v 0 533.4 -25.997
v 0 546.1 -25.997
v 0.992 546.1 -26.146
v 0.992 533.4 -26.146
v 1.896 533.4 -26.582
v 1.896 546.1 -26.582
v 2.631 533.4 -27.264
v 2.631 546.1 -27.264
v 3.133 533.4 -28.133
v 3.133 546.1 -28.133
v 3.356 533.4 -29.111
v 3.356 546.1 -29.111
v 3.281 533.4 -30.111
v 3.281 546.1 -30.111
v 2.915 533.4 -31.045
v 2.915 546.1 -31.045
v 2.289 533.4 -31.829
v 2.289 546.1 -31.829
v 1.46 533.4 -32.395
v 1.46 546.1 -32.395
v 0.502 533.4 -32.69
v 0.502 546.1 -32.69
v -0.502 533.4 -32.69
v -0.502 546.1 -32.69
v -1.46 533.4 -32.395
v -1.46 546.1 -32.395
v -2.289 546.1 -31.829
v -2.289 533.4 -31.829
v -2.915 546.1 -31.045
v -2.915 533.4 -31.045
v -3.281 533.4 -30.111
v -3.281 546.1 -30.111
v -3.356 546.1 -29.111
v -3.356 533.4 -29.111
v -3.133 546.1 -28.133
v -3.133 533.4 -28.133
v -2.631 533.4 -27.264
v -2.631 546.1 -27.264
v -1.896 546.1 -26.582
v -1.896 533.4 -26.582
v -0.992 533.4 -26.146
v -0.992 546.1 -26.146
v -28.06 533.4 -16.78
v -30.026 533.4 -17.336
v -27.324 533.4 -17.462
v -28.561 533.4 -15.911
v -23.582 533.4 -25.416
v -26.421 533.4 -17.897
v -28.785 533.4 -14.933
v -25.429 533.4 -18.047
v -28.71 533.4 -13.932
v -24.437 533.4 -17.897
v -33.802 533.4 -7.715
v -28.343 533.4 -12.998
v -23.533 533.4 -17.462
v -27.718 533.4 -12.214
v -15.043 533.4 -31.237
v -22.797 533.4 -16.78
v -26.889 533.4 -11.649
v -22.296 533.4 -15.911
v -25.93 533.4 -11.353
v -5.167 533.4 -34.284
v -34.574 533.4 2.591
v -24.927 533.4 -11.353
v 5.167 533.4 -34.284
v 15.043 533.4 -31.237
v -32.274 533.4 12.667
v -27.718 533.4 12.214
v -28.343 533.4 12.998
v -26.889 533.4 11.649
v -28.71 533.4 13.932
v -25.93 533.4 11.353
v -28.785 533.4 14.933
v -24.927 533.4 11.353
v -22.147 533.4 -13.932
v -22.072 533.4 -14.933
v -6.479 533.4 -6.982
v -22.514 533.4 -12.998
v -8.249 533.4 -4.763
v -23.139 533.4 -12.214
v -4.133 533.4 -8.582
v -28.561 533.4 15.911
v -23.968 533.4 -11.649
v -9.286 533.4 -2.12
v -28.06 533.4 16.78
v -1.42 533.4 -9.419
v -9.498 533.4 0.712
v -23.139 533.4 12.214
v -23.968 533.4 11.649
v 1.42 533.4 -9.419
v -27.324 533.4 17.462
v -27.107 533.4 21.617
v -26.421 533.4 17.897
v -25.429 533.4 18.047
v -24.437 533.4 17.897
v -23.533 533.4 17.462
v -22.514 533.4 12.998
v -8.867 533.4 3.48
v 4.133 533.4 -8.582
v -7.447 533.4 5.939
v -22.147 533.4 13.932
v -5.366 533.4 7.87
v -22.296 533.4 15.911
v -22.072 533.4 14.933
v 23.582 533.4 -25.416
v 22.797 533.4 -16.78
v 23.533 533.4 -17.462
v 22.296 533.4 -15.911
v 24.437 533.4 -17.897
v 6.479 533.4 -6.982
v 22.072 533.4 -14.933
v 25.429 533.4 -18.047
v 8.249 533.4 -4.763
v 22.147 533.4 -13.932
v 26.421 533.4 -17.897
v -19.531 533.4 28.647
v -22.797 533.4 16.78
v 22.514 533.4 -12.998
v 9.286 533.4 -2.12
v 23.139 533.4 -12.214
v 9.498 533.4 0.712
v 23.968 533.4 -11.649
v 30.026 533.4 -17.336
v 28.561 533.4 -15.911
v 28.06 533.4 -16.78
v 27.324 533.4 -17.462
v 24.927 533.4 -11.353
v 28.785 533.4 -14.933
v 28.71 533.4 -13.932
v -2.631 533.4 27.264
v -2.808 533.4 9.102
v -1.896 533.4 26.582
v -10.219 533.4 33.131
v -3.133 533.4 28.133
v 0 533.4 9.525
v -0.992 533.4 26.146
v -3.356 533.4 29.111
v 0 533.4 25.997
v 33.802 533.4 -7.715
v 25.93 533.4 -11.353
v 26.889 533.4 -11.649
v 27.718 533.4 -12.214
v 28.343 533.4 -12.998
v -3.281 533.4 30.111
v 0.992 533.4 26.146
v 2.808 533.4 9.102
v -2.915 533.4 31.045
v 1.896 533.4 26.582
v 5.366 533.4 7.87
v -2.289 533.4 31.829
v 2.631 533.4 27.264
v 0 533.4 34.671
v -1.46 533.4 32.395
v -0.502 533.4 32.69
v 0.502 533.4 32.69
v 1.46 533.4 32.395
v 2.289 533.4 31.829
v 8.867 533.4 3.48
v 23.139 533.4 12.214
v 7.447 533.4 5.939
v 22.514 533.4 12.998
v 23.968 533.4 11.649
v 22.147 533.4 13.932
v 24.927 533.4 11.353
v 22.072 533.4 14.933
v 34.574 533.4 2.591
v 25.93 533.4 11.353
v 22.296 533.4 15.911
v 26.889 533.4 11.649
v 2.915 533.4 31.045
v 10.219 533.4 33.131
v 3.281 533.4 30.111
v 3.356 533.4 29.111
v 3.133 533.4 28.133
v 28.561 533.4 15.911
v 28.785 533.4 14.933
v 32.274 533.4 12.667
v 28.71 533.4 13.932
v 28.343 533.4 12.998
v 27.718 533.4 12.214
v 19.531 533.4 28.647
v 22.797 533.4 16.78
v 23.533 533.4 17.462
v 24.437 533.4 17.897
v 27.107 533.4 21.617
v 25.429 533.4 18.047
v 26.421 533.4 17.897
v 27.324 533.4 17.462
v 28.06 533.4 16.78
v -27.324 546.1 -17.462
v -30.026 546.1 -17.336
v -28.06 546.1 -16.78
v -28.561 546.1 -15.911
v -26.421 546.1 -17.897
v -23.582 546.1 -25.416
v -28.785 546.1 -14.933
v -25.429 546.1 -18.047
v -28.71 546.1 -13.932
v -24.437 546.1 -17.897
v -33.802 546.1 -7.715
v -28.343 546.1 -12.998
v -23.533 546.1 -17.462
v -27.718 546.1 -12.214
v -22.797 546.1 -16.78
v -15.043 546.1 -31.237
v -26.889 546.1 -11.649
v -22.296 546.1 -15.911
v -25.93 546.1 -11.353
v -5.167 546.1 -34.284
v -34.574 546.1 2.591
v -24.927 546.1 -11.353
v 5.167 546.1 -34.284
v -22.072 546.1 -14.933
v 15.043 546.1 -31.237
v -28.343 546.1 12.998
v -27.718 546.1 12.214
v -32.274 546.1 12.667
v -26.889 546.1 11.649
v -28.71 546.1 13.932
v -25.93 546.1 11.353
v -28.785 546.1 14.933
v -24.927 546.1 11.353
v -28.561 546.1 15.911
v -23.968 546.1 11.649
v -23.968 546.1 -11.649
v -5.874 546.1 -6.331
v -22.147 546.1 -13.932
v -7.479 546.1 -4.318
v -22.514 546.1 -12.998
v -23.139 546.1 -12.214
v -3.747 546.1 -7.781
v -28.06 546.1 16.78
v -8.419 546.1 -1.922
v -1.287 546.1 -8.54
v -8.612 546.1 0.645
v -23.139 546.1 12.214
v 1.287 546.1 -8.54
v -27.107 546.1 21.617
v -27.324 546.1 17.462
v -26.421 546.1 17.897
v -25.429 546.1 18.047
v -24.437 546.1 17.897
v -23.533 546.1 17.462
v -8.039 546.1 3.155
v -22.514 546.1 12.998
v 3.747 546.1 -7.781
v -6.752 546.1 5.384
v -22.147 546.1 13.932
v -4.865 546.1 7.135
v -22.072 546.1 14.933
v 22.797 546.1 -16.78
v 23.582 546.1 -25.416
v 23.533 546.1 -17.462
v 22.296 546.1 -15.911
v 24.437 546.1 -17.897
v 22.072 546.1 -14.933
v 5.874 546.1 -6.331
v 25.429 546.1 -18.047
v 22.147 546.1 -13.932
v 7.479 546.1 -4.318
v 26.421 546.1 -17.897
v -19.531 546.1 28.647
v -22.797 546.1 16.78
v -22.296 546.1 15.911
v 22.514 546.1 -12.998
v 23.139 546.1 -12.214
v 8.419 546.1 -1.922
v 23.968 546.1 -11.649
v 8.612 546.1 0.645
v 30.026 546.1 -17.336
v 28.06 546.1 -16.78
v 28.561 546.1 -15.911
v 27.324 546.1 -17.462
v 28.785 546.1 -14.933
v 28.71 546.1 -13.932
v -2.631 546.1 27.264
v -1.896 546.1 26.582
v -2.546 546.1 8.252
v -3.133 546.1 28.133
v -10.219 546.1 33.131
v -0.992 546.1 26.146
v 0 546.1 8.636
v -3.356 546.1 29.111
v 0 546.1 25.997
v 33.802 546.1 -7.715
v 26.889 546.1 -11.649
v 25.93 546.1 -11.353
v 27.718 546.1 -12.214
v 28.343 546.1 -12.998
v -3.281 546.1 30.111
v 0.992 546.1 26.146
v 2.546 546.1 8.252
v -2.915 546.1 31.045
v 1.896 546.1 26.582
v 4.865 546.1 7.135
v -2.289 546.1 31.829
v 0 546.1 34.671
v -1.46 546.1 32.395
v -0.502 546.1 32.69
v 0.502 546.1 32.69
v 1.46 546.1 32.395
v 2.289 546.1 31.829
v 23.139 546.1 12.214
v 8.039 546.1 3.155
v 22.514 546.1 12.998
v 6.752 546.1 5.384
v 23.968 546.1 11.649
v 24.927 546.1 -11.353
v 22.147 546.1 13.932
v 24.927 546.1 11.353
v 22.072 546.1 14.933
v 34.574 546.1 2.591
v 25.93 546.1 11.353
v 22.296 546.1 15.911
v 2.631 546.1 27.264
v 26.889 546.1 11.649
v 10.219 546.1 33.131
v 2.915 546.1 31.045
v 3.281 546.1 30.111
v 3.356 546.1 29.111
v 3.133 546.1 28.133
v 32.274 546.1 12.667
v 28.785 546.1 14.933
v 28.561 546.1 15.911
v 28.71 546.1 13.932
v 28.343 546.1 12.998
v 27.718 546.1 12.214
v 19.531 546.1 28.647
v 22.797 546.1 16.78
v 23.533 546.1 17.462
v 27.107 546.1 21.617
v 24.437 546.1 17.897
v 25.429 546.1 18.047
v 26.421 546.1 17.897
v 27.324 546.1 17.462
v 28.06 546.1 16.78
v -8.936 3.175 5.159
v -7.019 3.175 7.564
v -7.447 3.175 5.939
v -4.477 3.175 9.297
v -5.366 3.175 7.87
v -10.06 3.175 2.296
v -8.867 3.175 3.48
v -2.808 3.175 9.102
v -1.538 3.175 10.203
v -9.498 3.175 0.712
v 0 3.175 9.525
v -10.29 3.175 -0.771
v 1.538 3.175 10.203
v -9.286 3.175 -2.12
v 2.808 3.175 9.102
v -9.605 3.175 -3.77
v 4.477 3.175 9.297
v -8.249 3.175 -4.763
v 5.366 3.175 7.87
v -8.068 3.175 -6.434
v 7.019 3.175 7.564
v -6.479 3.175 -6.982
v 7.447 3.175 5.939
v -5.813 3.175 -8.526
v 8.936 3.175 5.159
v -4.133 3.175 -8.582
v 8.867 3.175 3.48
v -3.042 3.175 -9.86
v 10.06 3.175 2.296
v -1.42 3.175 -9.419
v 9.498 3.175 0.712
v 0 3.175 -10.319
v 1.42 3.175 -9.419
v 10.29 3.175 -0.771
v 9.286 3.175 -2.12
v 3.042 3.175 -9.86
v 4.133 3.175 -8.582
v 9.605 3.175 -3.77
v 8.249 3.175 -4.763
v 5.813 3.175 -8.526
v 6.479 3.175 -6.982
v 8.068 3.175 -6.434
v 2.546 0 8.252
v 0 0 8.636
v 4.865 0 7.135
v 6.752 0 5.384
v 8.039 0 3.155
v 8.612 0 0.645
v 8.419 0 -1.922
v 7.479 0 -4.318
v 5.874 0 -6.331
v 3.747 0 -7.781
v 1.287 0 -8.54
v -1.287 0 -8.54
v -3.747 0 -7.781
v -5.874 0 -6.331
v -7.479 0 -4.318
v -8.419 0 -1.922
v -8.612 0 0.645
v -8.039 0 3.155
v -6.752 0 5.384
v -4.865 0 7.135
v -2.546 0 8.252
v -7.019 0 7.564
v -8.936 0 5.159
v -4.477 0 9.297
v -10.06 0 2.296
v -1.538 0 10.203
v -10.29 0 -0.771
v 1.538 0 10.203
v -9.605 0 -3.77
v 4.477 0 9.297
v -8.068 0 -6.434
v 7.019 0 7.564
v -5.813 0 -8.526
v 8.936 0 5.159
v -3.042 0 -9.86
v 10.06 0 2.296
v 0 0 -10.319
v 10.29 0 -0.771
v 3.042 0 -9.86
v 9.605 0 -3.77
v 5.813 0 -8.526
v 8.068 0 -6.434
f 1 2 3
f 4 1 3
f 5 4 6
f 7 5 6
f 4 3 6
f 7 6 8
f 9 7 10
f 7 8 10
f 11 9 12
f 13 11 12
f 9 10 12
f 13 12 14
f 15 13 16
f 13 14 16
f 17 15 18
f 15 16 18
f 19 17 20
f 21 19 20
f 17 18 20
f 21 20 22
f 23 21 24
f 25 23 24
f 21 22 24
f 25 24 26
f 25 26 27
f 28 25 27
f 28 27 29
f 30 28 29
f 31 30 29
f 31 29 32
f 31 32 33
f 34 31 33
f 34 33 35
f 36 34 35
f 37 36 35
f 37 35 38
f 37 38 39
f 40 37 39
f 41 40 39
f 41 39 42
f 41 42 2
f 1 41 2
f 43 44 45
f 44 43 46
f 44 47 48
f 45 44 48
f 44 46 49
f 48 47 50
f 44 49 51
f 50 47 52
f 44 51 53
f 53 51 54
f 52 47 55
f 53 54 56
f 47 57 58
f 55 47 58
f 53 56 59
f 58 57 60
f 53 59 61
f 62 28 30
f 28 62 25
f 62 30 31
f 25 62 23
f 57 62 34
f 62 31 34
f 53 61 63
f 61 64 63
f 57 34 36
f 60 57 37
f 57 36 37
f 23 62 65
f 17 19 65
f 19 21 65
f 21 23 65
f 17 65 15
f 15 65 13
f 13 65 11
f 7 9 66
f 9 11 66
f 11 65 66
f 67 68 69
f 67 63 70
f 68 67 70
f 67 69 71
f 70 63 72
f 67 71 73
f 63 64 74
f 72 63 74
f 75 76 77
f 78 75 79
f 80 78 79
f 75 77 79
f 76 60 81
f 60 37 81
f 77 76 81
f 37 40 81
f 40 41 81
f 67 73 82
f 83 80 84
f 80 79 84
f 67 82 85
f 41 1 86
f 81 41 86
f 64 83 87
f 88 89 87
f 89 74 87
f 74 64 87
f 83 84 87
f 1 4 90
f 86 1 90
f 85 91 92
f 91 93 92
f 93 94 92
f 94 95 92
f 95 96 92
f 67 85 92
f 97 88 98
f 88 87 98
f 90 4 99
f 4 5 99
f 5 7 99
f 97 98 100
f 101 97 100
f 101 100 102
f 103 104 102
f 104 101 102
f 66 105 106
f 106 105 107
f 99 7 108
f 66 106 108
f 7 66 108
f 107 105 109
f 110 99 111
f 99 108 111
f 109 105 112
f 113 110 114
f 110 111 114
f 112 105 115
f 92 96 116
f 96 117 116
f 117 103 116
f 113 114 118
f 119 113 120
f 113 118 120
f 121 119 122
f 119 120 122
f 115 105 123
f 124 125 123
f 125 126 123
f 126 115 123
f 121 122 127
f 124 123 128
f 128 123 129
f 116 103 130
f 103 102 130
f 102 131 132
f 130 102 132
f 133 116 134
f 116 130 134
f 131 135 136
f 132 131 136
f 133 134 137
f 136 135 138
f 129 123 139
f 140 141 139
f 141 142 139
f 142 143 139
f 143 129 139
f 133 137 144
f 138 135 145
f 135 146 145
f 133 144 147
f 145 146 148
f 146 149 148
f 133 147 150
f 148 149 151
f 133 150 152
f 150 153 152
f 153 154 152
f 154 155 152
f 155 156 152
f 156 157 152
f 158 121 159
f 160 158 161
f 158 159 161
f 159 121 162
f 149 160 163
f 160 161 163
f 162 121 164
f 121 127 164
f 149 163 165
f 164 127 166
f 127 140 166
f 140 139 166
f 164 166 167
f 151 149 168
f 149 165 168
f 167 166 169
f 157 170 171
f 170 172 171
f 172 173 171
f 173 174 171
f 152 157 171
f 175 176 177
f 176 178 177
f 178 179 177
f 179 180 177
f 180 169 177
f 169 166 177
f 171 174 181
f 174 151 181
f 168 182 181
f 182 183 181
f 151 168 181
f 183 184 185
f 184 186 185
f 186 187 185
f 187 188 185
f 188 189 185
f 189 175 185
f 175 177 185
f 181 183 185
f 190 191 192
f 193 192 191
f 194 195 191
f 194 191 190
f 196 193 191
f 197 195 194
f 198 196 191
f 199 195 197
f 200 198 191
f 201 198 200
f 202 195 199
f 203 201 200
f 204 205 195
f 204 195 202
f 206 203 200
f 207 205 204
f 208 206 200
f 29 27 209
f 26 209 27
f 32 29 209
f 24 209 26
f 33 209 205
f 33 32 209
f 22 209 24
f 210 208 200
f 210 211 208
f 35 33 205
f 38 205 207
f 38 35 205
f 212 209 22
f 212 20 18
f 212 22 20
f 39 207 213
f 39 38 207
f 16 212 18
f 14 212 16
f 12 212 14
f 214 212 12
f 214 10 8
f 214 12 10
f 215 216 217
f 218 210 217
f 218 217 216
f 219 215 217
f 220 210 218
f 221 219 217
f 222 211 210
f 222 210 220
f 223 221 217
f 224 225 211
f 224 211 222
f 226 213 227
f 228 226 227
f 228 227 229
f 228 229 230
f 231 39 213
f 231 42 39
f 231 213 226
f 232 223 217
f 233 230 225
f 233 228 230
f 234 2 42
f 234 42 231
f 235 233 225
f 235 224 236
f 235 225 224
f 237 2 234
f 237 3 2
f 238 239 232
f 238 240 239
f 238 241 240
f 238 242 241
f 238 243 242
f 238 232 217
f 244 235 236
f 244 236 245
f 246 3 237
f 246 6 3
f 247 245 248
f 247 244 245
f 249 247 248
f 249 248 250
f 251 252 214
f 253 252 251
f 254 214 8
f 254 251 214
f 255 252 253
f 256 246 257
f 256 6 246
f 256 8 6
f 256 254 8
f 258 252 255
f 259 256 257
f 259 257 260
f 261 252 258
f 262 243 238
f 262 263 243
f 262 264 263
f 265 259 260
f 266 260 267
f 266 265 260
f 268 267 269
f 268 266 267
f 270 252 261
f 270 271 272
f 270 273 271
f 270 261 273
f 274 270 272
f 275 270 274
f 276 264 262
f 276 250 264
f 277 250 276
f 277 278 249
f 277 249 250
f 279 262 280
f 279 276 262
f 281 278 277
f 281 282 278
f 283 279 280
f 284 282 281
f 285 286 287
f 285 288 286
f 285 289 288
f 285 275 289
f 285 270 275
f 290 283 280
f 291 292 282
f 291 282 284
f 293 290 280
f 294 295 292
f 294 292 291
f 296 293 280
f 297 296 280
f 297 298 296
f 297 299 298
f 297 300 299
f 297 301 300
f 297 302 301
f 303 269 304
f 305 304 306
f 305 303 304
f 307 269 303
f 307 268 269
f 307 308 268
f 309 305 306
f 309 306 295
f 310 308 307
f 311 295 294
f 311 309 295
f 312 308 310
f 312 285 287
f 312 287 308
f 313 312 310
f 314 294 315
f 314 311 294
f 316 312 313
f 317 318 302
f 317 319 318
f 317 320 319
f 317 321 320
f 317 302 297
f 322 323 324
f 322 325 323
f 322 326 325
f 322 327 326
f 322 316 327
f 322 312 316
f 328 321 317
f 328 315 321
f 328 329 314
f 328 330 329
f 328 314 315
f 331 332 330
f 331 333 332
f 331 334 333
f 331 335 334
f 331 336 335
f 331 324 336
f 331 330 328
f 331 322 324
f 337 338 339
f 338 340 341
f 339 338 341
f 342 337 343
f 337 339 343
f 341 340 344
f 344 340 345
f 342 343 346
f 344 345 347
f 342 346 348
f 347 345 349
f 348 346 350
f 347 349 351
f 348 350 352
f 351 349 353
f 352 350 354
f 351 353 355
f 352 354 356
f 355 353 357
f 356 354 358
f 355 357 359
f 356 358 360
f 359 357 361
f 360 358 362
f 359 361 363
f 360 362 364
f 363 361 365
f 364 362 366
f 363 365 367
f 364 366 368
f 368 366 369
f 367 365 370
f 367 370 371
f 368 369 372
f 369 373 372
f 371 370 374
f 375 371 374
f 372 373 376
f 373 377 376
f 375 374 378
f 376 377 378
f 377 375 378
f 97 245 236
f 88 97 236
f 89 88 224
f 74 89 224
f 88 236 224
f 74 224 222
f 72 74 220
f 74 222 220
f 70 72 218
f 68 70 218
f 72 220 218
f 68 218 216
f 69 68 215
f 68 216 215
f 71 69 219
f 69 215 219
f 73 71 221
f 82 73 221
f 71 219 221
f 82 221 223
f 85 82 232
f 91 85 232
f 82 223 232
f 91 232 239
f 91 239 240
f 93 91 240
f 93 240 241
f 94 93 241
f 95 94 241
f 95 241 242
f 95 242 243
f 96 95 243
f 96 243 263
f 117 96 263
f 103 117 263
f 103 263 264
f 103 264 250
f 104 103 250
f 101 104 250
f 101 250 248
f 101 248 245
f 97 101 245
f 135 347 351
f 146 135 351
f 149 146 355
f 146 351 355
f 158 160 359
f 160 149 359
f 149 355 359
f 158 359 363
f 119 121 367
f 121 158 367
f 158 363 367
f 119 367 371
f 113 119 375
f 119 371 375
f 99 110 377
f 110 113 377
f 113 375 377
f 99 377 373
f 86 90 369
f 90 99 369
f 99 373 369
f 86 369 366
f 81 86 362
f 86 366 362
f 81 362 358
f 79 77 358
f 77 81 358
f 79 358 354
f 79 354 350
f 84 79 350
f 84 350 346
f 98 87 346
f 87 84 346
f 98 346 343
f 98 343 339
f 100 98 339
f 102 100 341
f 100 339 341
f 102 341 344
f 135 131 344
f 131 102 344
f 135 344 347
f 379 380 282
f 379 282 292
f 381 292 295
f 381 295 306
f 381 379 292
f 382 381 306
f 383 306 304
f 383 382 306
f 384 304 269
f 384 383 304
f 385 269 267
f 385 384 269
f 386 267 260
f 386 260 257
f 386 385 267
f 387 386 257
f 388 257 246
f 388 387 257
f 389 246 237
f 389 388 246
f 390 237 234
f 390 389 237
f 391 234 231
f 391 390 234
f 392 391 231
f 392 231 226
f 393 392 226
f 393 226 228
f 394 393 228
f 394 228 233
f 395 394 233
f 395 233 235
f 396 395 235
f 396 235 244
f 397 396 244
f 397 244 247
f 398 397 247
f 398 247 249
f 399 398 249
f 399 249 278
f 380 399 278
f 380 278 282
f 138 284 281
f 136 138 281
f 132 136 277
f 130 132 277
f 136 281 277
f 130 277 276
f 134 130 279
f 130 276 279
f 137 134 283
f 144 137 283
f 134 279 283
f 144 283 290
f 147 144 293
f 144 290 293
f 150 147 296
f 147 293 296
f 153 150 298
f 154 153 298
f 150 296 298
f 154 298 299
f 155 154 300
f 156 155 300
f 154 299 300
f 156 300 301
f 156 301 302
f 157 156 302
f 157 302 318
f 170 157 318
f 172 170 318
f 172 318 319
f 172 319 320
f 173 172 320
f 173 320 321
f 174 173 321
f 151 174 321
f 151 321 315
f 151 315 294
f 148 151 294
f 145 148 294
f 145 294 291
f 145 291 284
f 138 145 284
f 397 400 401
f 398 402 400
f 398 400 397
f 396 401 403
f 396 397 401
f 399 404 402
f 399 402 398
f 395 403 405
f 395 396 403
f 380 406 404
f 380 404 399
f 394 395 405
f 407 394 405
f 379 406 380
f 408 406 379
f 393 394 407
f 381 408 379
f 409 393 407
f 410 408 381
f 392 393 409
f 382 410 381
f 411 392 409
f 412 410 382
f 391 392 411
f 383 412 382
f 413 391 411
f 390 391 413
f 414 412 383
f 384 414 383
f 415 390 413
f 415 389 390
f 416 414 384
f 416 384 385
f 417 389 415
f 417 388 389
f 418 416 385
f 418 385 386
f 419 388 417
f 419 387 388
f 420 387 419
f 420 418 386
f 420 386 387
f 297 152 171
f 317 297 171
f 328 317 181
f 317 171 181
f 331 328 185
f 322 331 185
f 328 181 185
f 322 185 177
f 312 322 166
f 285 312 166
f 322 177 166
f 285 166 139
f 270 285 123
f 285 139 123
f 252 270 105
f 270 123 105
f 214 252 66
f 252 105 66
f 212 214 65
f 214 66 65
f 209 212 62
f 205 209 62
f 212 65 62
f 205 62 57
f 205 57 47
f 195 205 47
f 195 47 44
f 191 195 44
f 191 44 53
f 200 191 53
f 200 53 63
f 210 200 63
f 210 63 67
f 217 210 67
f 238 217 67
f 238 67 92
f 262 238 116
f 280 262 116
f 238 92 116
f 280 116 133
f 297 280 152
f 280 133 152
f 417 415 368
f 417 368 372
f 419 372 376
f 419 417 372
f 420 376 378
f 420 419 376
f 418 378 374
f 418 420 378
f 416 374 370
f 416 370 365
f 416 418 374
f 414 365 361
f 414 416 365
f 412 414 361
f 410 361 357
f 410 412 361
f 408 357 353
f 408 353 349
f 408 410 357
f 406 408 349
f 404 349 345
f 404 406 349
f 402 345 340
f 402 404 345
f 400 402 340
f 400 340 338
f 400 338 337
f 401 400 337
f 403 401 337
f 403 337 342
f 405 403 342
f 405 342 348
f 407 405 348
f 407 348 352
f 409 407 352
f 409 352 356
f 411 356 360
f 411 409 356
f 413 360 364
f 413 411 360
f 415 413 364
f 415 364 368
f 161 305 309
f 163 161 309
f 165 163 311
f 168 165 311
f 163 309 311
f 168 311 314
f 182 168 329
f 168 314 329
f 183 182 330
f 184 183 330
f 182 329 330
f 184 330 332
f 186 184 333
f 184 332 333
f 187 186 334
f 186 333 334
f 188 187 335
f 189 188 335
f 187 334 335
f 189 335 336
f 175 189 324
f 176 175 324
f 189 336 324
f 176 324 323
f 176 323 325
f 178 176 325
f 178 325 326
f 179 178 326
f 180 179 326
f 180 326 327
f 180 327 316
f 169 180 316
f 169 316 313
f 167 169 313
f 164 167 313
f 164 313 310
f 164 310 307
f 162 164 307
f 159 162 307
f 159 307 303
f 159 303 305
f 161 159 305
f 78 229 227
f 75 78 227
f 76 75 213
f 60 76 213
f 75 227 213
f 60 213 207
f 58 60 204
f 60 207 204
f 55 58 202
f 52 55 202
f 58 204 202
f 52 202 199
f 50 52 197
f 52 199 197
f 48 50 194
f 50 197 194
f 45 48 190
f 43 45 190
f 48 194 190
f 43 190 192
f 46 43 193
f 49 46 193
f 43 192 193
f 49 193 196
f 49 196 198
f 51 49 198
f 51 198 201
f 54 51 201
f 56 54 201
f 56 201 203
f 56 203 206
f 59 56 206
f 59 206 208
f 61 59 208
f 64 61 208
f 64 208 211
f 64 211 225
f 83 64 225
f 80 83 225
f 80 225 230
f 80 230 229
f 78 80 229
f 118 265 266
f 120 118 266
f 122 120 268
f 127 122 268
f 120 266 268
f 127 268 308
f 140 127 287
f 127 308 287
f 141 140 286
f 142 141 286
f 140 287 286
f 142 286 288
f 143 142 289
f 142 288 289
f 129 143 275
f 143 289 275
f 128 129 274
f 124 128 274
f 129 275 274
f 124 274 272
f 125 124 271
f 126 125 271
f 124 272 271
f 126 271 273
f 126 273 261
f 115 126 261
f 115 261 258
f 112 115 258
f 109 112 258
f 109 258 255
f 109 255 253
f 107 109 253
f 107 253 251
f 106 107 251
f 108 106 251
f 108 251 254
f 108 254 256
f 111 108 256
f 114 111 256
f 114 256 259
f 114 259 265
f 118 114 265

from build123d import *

# Parameters (mm, degrees)
SKETCH1_R         = 9.525
SKETCH1_R_2       = 8.636
EXTRUDE1_DEPTH    = 546.1
EXTRUDE2_START    = -12.7
SKETCH2_R         = 34.671
SKETCH2_R_2       = 8.636
EXTRUDE2_DEPTH    = 12.7
SKETCH3_R         = 3.3655
EXTRUDE3_DEPTH    = 549.296786861
CIRPATTERN1_COUNT = 6
SKETCH4_R         = 10.31875
SKETCH4_R_2       = 8.636
EXTRUDE4_DEPTH    = 3.175


with BuildPart() as part:
    # Sketch1 → Extrude1 (new body)
    with BuildSketch(Plane(origin=(0, 0, 0), x_dir=(1, 0, 0), z_dir=(0, 1, 0))):
        with Locations(Location((0, 0, 0), (0, 0, 270))):
            Circle(SKETCH1_R)
        with Locations(Location((0, 0, 0), (0, 0, 270))):
            Circle(SKETCH1_R_2, mode=Mode.SUBTRACT)
    extrude(amount=EXTRUDE1_DEPTH)

    # Sketch2 → Extrude2 (add)
    with BuildSketch(Plane(origin=(0, 546.1, 0), x_dir=(1, 0, 0), z_dir=(0, 1, 0)).offset(EXTRUDE2_START)):
        with Locations(Location((0, 0, 0), (0, 0, 270))):
            Circle(SKETCH2_R)
        with Locations(Location((0, 0, 0), (0, 0, 270))):
            Circle(SKETCH2_R_2, mode=Mode.SUBTRACT)
    extrude(amount=EXTRUDE2_DEPTH)

    # Sketch3 → Extrude3 (cut, through all)
    with BuildSketch(Plane(origin=(0, 546.1, 0), x_dir=(1, 0, 0), z_dir=(0, 1, 0))):
        with Locations(Location((0, 29.3624, 0), (0, 0, 270))):
            Circle(SKETCH3_R)
    extrude3 = extrude(amount=-EXTRUDE3_DEPTH, mode=Mode.SUBTRACT)

    # CirPattern1: Extrude3 ×6 about axis
    cirpattern1_axis = Axis((0, 0, 0), (0, 1, 0))
    for i in range(1, CIRPATTERN1_COUNT):
        add(extrude3.rotate(cirpattern1_axis, i * 360 / CIRPATTERN1_COUNT), mode=Mode.SUBTRACT)

    # Sketch4 → Extrude4 (add)
    with BuildSketch(Plane.XZ):
        with Locations(Location((0, 0, 0), (0, 0, 270))):
            Circle(SKETCH4_R)
        with Locations(Location((0, 0, 0), (0, 0, 90))):
            Circle(SKETCH4_R_2, mode=Mode.SUBTRACT)
    extrude(amount=-EXTRUDE4_DEPTH)


solid = part.part
